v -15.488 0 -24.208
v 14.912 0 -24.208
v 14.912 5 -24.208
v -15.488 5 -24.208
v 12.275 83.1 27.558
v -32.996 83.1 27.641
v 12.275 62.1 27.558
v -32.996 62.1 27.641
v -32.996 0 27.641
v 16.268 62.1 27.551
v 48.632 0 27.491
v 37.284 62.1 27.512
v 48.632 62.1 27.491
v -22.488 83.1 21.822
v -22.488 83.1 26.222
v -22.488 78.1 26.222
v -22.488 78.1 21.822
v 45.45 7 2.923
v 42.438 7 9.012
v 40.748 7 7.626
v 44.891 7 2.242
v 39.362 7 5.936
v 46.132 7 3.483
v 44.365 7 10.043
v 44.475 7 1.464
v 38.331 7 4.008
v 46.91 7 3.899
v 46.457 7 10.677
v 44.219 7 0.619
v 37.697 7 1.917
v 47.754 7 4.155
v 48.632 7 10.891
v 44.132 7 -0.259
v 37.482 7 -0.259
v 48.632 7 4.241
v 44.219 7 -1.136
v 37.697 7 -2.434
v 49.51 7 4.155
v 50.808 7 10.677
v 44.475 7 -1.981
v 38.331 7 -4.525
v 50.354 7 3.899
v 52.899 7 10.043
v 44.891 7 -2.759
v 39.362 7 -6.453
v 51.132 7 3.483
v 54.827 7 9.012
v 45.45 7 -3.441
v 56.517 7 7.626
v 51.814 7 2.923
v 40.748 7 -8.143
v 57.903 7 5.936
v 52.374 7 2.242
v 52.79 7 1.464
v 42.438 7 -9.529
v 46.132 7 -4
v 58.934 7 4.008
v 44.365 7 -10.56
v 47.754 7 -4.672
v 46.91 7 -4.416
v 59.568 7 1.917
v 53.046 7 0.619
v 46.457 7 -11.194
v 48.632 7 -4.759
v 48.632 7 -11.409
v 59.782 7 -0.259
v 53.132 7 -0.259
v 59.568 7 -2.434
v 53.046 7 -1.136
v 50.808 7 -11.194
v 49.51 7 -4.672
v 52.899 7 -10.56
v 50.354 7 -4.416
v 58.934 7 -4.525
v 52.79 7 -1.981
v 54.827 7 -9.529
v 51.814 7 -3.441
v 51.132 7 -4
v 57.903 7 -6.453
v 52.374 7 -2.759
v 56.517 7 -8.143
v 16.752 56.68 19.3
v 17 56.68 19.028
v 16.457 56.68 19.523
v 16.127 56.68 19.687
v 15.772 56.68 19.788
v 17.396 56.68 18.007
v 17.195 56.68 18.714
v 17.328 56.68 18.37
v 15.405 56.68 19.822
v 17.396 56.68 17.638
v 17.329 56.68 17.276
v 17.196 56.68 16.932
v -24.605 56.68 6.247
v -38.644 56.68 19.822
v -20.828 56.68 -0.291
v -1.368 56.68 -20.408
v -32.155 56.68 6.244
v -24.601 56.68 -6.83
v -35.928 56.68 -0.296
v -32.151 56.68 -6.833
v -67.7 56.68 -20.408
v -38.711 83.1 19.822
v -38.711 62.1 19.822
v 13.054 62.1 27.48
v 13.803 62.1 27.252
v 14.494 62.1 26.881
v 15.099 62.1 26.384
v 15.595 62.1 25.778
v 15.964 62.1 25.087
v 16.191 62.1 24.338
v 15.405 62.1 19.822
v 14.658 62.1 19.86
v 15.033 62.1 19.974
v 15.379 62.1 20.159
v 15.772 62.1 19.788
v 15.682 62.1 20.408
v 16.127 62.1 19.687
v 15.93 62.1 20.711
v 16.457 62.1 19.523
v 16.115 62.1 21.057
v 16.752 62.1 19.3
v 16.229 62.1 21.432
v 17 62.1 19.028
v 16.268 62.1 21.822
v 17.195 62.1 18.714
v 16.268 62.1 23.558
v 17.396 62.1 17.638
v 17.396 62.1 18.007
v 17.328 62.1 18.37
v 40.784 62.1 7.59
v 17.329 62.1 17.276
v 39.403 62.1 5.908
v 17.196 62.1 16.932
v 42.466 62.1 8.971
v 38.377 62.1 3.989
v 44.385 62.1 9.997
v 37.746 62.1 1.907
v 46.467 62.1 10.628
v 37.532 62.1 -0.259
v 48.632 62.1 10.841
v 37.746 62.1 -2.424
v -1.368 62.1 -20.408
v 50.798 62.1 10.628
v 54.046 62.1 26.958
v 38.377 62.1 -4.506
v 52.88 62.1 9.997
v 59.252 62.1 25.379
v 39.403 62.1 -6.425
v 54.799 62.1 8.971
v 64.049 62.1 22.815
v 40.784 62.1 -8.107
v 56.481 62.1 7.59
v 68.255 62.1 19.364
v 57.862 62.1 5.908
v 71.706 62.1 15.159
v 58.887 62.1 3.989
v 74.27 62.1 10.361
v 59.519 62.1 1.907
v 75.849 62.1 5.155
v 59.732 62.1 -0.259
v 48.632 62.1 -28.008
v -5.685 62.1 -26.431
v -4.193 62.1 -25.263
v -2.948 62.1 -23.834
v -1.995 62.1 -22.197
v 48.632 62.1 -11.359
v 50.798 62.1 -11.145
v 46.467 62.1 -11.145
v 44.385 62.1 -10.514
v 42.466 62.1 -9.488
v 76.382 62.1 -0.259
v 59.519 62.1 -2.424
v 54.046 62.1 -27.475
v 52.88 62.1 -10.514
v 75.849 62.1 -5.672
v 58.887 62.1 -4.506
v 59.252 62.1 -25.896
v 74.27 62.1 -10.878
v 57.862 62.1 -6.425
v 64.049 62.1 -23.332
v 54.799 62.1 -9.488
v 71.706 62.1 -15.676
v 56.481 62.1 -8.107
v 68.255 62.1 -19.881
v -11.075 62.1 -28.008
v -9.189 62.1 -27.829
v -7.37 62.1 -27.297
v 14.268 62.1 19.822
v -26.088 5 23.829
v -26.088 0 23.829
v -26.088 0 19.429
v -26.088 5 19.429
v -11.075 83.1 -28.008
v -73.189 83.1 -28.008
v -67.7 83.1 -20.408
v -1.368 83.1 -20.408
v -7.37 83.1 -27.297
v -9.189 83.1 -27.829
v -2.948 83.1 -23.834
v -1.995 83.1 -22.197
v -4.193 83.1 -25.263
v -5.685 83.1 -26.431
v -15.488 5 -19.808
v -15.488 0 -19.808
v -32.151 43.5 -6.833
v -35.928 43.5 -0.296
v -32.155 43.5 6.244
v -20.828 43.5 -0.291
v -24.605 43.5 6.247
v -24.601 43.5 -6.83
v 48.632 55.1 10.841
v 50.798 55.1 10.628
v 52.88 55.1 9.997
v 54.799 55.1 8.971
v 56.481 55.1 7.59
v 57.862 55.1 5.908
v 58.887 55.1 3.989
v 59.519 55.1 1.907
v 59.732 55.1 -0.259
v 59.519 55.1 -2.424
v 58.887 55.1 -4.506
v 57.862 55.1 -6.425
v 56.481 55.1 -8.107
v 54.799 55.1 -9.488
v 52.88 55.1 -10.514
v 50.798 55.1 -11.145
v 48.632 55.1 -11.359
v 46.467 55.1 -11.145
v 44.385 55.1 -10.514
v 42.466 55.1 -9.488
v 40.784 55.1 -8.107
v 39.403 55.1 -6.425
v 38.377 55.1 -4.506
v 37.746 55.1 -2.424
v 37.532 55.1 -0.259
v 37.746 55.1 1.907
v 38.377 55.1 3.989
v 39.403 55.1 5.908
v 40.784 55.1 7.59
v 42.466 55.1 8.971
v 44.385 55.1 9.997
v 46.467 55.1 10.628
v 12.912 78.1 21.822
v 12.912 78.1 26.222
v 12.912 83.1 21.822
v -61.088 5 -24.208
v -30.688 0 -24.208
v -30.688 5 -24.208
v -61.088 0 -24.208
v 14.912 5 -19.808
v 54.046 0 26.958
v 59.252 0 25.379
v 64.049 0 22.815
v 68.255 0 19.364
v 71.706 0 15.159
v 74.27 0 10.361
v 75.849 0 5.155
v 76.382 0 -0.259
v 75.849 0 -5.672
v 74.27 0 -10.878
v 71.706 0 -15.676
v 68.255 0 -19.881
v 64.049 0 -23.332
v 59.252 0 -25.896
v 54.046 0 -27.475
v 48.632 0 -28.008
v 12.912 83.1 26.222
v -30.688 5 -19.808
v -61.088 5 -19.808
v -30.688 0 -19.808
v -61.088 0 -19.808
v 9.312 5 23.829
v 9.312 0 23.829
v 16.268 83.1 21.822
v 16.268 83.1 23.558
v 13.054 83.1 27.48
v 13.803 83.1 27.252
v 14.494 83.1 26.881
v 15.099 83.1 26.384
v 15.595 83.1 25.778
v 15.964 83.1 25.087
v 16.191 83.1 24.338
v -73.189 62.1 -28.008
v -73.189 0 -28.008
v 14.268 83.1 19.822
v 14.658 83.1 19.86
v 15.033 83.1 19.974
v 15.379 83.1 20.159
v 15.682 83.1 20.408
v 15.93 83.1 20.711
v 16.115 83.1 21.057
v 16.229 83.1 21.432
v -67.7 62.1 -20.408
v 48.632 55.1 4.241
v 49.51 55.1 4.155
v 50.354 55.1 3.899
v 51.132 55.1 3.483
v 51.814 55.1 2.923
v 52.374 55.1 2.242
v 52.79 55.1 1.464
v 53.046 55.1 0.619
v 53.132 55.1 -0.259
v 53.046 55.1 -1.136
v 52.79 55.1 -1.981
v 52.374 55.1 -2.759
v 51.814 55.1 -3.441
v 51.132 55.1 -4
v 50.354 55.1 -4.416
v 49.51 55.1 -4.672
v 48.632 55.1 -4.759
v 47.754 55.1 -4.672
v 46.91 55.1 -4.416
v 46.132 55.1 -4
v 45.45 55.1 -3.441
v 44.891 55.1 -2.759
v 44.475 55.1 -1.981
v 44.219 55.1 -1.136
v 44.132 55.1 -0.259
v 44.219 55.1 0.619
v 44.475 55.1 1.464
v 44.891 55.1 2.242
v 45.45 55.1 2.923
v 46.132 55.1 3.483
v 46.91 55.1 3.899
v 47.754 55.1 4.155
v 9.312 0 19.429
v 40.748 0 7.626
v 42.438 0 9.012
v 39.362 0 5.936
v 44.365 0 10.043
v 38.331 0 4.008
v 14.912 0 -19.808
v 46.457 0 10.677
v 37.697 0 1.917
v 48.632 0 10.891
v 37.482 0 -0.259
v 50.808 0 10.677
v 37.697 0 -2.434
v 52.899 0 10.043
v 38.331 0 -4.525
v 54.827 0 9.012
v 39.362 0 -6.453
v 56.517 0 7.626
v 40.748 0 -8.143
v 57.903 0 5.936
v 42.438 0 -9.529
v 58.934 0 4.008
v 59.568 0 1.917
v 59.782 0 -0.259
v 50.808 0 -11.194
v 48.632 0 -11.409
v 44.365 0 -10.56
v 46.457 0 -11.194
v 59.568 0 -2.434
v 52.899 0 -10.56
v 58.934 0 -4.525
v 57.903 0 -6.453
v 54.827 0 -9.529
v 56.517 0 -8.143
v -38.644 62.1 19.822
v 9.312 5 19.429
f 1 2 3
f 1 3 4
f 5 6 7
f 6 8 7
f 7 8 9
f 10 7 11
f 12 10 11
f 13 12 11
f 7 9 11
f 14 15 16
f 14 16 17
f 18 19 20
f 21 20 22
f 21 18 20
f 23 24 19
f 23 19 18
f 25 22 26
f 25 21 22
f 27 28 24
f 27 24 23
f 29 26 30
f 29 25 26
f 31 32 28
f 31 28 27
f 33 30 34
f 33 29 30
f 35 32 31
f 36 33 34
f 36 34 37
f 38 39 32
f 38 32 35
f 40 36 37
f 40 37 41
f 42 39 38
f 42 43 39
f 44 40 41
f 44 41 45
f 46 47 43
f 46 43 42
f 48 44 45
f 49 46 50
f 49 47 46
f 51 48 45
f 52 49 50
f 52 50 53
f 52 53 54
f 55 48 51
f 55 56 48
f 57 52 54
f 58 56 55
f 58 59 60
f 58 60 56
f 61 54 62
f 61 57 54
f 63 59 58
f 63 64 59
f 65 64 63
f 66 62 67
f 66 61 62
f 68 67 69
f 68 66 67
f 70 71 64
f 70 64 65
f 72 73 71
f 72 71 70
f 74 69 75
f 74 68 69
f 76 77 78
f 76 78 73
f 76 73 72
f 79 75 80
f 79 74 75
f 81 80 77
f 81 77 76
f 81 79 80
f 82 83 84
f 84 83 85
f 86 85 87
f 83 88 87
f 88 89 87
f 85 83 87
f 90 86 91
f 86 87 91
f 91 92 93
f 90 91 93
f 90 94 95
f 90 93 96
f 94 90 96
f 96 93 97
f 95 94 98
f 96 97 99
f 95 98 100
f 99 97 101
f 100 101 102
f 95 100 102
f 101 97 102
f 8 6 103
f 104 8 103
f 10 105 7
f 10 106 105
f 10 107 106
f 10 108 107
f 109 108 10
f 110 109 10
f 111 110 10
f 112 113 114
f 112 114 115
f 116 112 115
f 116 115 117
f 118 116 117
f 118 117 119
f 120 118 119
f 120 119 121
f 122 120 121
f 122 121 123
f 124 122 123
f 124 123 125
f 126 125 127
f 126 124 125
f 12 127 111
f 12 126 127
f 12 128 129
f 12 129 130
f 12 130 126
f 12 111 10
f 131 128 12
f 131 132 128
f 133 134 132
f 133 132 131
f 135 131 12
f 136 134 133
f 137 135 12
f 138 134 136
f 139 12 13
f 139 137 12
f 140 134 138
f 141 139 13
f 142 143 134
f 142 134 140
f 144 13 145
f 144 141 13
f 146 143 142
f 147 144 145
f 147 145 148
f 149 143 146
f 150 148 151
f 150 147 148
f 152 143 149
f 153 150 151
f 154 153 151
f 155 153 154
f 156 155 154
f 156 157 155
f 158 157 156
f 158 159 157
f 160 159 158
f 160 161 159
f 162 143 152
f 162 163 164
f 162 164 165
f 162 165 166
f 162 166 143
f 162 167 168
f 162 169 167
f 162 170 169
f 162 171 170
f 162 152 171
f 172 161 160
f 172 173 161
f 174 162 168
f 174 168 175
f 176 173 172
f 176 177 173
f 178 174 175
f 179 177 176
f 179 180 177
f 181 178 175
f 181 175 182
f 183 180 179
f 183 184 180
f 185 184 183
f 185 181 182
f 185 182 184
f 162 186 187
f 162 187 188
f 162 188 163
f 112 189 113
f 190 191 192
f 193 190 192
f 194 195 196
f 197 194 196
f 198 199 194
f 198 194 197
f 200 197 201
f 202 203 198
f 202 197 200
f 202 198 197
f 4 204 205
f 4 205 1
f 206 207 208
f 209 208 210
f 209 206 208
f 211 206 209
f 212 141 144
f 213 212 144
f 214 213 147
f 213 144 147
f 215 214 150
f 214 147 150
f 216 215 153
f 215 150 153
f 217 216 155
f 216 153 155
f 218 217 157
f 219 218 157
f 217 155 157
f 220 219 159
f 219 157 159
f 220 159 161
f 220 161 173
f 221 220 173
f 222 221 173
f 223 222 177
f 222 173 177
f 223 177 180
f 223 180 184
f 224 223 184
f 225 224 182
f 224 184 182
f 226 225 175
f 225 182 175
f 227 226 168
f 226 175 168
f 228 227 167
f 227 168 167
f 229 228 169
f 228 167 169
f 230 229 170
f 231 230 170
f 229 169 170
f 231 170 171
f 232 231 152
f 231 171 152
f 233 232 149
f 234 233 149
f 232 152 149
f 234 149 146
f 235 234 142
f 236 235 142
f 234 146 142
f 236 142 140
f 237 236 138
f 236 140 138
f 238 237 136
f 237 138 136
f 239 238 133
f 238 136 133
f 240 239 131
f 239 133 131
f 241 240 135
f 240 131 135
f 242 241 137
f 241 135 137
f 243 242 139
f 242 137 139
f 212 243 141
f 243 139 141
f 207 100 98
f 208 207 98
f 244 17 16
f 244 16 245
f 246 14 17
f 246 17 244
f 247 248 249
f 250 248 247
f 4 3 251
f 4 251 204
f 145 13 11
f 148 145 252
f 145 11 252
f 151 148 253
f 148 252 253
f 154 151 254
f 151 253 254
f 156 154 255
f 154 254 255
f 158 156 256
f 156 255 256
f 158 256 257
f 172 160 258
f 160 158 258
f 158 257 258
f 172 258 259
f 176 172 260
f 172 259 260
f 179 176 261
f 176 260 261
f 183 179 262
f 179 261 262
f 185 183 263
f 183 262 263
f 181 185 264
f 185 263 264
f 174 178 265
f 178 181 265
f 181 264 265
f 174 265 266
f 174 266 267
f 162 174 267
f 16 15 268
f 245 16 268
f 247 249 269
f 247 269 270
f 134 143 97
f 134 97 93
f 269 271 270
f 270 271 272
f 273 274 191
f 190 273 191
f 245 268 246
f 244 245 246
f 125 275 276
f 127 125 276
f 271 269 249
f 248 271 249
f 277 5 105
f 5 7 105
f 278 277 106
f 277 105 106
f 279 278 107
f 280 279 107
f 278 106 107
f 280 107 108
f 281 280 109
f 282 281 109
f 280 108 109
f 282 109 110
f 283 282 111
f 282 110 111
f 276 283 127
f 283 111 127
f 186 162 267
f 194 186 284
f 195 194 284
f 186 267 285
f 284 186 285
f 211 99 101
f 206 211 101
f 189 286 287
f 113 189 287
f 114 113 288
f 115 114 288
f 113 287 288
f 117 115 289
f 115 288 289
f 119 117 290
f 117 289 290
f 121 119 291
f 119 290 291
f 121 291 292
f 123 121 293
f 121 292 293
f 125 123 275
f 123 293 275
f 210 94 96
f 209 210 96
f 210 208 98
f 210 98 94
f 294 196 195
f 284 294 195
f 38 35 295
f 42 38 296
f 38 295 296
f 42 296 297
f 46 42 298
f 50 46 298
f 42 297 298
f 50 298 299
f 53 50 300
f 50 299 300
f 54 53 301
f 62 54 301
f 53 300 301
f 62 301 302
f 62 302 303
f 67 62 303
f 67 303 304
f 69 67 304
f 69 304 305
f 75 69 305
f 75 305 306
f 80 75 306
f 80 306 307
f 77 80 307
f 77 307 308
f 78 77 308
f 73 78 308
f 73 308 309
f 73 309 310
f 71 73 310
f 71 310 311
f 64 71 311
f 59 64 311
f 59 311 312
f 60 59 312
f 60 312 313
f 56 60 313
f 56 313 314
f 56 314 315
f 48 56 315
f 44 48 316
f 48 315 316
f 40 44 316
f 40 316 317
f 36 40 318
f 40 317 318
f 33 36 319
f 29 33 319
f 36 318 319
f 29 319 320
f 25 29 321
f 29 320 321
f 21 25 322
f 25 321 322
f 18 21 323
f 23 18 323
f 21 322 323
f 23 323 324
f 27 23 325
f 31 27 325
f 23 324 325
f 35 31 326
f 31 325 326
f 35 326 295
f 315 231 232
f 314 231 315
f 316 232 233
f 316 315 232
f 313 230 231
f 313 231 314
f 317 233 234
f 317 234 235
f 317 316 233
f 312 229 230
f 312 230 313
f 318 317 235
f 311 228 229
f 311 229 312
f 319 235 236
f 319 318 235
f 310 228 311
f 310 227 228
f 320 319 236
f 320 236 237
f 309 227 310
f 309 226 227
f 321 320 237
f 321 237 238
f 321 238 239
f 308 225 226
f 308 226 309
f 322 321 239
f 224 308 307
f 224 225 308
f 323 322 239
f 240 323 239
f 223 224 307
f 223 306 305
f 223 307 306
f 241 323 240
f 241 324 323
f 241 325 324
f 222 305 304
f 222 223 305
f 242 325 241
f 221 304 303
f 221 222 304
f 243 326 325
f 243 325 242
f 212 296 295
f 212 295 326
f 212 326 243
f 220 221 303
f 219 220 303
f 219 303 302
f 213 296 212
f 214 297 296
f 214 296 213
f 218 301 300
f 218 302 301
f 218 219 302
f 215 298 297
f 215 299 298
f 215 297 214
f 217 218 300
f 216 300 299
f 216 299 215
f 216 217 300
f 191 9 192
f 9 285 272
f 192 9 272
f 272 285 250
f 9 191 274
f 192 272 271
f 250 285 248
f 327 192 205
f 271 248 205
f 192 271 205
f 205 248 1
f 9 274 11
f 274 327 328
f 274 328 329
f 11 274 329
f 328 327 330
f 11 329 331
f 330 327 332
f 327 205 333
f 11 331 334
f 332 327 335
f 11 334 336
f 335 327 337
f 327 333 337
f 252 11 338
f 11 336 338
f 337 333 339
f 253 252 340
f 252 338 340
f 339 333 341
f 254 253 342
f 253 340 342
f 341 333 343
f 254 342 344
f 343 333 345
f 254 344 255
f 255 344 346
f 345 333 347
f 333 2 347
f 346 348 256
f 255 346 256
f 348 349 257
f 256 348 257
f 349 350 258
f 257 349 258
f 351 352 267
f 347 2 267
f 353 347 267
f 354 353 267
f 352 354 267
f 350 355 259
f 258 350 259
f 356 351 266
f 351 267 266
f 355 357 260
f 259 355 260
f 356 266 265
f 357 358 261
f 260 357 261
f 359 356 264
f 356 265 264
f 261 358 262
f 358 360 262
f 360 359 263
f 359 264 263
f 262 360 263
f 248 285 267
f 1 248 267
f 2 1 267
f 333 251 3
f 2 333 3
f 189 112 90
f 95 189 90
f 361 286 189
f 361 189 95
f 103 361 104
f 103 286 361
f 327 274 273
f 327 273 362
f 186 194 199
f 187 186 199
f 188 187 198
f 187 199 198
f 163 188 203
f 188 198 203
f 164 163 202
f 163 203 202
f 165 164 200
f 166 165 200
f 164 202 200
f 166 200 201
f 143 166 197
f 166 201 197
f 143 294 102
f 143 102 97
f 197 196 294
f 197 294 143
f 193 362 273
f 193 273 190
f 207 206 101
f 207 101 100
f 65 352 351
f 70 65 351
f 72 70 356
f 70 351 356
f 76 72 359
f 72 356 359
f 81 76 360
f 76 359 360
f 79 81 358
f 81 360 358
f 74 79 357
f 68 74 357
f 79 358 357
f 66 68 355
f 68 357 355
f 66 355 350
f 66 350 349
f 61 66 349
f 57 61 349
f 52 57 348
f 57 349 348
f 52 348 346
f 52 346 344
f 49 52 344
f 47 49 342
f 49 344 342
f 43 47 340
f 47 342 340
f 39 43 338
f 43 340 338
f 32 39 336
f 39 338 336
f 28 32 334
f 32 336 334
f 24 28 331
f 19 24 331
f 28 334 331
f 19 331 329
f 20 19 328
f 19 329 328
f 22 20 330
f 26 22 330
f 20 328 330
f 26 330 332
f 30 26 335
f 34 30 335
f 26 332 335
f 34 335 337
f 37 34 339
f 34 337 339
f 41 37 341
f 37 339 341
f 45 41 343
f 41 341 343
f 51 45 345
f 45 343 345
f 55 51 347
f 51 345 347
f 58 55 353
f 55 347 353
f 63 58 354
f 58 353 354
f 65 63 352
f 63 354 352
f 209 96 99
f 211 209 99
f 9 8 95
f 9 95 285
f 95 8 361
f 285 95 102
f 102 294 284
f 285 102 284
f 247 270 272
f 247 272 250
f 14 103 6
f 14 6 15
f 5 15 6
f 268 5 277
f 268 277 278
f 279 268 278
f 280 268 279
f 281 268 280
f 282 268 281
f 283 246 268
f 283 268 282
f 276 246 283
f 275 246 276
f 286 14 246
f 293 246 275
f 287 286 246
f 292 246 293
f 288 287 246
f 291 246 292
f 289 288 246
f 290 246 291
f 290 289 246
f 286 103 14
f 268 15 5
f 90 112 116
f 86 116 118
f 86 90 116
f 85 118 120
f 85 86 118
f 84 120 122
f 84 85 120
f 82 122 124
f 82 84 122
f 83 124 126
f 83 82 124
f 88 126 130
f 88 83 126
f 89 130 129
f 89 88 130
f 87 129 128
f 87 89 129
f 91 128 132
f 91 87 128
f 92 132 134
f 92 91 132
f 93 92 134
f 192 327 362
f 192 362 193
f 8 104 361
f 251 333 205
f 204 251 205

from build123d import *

# Parameters (mm, degrees)
EXTRUDE_1_DEPTH      = 83.1
SKETCH_2_W           = 35.4
SKETCH_2_H           = 4.4
SKETCH_2_W_2         = 30.4
CUT_EXTRUDE_1_DEPTH  = 5
SKETCH_3_W           = 35.4
SKETCH_3_H           = 4.4
CUT_EXTRUDE_2_DEPTH  = 5
CUT_EXTRUDE_4_DEPTH  = 21
SKETCH_7_R           = 4.5
CUT_EXTRUDE_5_DEPTH  = 107.120558328
SKETCH_8_R           = 11.1
CUT_EXTRUDE_6_DEPTH  = 7
SKETCH_9_R           = 11.15
CUT_EXTRUDE_7_DEPTH  = 7
CUT_EXTRUDE_8_DEPTH  = 107.120558328
FILLET_1_R           = 10
CUT_EXTRUDE_9_DEPTH  = 18.6
CUT_EXTRUDE_10_DEPTH = 5.42
FILLET_2_R           = 2
FILLET_3_R           = 2
FILLET_4_R           = 4


with BuildPart() as part:
    # Эскиз1 → Бобышка-Вытянуть1 (new body)
    with BuildSketch(Plane(origin=(0, 0, 0), x_dir=(1, 0, 0), z_dir=(0, 1, 0))):
        with BuildLine():
            Line((48.631682576, -27.49140627), (48.632387335, -27.491404976))
            ThreePointArc((48.632387335, -27.491404976), (76.382325871, 0.258533559), (48.632387335, 28.008472095))
            Line((48.632387335, 28.008472095), (-81.367612665, 28.008472095))
            Line((-81.367612665, 28.008472095), (-81.367612665, -27.730072458))
            Line((-81.367612665, -27.730072458), (48.631682576, -27.49140627))
        make_face()
    extrude(amount=EXTRUDE_1_DEPTH)

    # Эскиз2 → Вырез-Вытянуть1 (cut)
    with BuildSketch(Plane(origin=(0, 0, 0), x_dir=(-1, 0, 0), z_dir=(0, -1, 0))):
        with Locations((8.387612665, -21.628577297)):
            Rectangle(SKETCH_2_W, SKETCH_2_H)
        with Locations((45.887612665, 22.008472095)):
            Rectangle(SKETCH_2_W_2, SKETCH_2_H)
        with Locations((0.287612665, 22.008472095)):
            Rectangle(SKETCH_2_W_2, SKETCH_2_H)
    extrude(amount=-CUT_EXTRUDE_1_DEPTH, mode=Mode.SUBTRACT)

    # Эскиз3 → Вырез-Вытянуть2 (cut)
    with BuildSketch(Plane(origin=(0, 83.1, 0), x_dir=(1, 0, 0), z_dir=(0, 1, 0))):
        with Locations((-4.787612665, -24.021972088)):
            Rectangle(SKETCH_3_W, SKETCH_3_H)
    extrude(amount=-CUT_EXTRUDE_2_DEPTH, mode=Mode.SUBTRACT)

    # Эскиз6 → Вырез-Вытянуть4 (cut)
    with BuildSketch(Plane(origin=(0, 83.1, 0), x_dir=(1, 0, 0), z_dir=(0, 1, 0))):
        with BuildLine():
            Line((-38.710860793, -19.821972088), (16.267507788, -19.821972088))
            Line((16.267507788, -19.821972088), (16.267507788, -27.550823779))
            Line((16.267507788, -27.550823779), (37.284075999, -27.512239383))
            ThreePointArc((37.284075999, -27.512239383), (78.632374752, 0.286010542), (37.233224591, 28.008472095))
            Line((37.233224591, 28.008472095), (-1.367612665, 28.008472095))
            Line((-1.367612665, 28.008472095), (-1.367612665, 20.408472095))
            Line((-1.367612665, 20.408472095), (-67.700309337, 20.408472095))
            Line((-67.700309337, 20.408472095), (-73.189452249, 28.008472095))
            Line((-73.189452249, 28.008472095), (-81.367612665, 28.008472095))
            Line((-81.367612665, 28.008472095), (-81.367612665, -27.730072458))
            Line((-81.367612665, -27.730072458), (-32.996113938, -27.641267044))
            Line((-32.996113938, -27.641267044), (-38.710860793, -19.821972088))
        make_face()
    extrude(amount=-CUT_EXTRUDE_4_DEPTH, mode=Mode.SUBTRACT)

    # Эскиз7 → Вырез-Вытянуть5 (cut, through all)
    with BuildSketch(Plane(origin=(0, 62.1, 0), x_dir=(1, 0, 0), z_dir=(0, 1, 0))):
        with Locations(Location((48.632387335, 0.258533559, 0), (0, 0, 270))):
            Circle(SKETCH_7_R)
    extrude(amount=-CUT_EXTRUDE_5_DEPTH, mode=Mode.SUBTRACT)

    # Эскиз8 → Вырез-Вытянуть6 (cut)
    with BuildSketch(Plane(origin=(0, 62.1, 0), x_dir=(1, 0, 0), z_dir=(0, 1, 0))):
        with Locations(Location((48.632387335, 0.258533559, 0), (0, 0, 270))):
            Circle(SKETCH_8_R)
    extrude(amount=-CUT_EXTRUDE_6_DEPTH, mode=Mode.SUBTRACT)

    # Эскиз9 → Вырез-Вытянуть7 (cut)
    with BuildSketch(Plane.XZ):
        with Locations(Location((48.632387335, -0.258533559, 0), (0, 0, 270))):
            Circle(SKETCH_9_R)
    extrude(amount=-CUT_EXTRUDE_7_DEPTH, mode=Mode.SUBTRACT)

    # Эскиз10 → Вырез-Вытянуть8 (cut, through all)
    with BuildSketch(Plane(origin=(0, 62.1, 0), x_dir=(1, 0, 0), z_dir=(0, 1, 0))):
        Polygon((-73.189452249, 28.008472095), (-81.367612665, 28.008472095), (-81.367612665, -27.730072458), (-32.996113938, -27.641267044), align=None)
    extrude(amount=-CUT_EXTRUDE_8_DEPTH, mode=Mode.SUBTRACT)

    # Скругление1
    # the kernel refuses this fillet: 10 mm, written as the material it takes off along each edge
    with BuildSketch(Plane(origin=(-1.367612665, 107.369322199, -28.008472095), x_dir=(0, 0, 1), z_dir=(0, -1, 0))) as fillet_1_piece_1:
        with BuildLine():
            CenterArc((10, 9.70772888), FILLET_1_R, 180, 76.113459637)
            Line((0, 9.70772888), (-0.2, 9.70772888))
            Line((-0.2, 9.70772888), (-0.2, 0))
            Line((-0.2, 0), (0, -0.2))
            ThreePointArc((0, -0.2), (3.8, -0.2), (7.552, -0.194154578))
            Line((7.552, -0.194154578), (7.6, 0))
        make_face()
    extrude(amount=45.269322199, mode=Mode.SUBTRACT)

    # Эскиз11 → Вырез-Вытянуть9 (cut)
    with BuildSketch(Plane(origin=(0, 62.1, 0), x_dir=(1, 0, 0), z_dir=(0, 1, 0))):
        Polygon((-35.9280852, 0.295824639), (-32.155315119, -6.243954097), (-24.605315558, -6.246528733), (-20.828086078, 0.290675368), (-24.600856158, 6.830454104), (-32.150855719, 6.833028739), align=None)
    extrude(amount=-CUT_EXTRUDE_9_DEPTH, mode=Mode.SUBTRACT)

    # Эскиз12 → Вырез-Вытянуть10 (cut)
    with BuildSketch(Plane(origin=(0, 62.1, 0), x_dir=(1, 0, 0), z_dir=(0, 1, 0))):
        Polygon((-1.367612665, 20.408472095), (18.632387335, -19.821972088), (-38.710860793, -19.821972088), (-67.700309337, 20.408472095), align=None)
    extrude(amount=-CUT_EXTRUDE_10_DEPTH, mode=Mode.SUBTRACT)

    # Скругление2
    fillet_2_edges = [part.edges().sort_by_distance(p)[0] for p in [
        (18.632387335, 59.39, 19.821972088),
    ]]
    fillet(fillet_2_edges, radius=FILLET_2_R)

    # Скругление3
    # the kernel refuses this fillet: 2 mm, written as the material it takes off along each edge
    with BuildSketch(Plane(origin=(16.267507788, 88.589321146, 19.62624363), x_dir=(-0.9952454215977946, 0, 0.09739892601373129), z_dir=(0, -1, 0))) as fillet_3_piece_1:
        with BuildLine():
            CenterArc((2.204352437, -1.990490843), FILLET_3_R, 95.589408628, 90)
            Line((0.213861594, -2.185288695), (0.014812509, -2.20476848))
            Line((0.014812509, -2.20476848), (-0.199049084, -0.019479785))
            Line((-0.199049084, -0.019479785), (0.068306766, 0.187973896))
            ThreePointArc((0.068306766, 0.187973896), (0.858385725, 0.088297205), (1.9900748, 0.199049084))
            Line((1.9900748, 0.199049084), (2.009554585, 0))
        make_face()
    extrude(amount=26.489321146, mode=Mode.SUBTRACT)

    # Скругление4
    fillet_4_edges = [part.edges().sort_by_distance(p)[0] for p in [
        (16.267507788, 72.6, 27.550823779),
    ]]
    fillet(fillet_4_edges, radius=FILLET_4_R)


solid = part.part
